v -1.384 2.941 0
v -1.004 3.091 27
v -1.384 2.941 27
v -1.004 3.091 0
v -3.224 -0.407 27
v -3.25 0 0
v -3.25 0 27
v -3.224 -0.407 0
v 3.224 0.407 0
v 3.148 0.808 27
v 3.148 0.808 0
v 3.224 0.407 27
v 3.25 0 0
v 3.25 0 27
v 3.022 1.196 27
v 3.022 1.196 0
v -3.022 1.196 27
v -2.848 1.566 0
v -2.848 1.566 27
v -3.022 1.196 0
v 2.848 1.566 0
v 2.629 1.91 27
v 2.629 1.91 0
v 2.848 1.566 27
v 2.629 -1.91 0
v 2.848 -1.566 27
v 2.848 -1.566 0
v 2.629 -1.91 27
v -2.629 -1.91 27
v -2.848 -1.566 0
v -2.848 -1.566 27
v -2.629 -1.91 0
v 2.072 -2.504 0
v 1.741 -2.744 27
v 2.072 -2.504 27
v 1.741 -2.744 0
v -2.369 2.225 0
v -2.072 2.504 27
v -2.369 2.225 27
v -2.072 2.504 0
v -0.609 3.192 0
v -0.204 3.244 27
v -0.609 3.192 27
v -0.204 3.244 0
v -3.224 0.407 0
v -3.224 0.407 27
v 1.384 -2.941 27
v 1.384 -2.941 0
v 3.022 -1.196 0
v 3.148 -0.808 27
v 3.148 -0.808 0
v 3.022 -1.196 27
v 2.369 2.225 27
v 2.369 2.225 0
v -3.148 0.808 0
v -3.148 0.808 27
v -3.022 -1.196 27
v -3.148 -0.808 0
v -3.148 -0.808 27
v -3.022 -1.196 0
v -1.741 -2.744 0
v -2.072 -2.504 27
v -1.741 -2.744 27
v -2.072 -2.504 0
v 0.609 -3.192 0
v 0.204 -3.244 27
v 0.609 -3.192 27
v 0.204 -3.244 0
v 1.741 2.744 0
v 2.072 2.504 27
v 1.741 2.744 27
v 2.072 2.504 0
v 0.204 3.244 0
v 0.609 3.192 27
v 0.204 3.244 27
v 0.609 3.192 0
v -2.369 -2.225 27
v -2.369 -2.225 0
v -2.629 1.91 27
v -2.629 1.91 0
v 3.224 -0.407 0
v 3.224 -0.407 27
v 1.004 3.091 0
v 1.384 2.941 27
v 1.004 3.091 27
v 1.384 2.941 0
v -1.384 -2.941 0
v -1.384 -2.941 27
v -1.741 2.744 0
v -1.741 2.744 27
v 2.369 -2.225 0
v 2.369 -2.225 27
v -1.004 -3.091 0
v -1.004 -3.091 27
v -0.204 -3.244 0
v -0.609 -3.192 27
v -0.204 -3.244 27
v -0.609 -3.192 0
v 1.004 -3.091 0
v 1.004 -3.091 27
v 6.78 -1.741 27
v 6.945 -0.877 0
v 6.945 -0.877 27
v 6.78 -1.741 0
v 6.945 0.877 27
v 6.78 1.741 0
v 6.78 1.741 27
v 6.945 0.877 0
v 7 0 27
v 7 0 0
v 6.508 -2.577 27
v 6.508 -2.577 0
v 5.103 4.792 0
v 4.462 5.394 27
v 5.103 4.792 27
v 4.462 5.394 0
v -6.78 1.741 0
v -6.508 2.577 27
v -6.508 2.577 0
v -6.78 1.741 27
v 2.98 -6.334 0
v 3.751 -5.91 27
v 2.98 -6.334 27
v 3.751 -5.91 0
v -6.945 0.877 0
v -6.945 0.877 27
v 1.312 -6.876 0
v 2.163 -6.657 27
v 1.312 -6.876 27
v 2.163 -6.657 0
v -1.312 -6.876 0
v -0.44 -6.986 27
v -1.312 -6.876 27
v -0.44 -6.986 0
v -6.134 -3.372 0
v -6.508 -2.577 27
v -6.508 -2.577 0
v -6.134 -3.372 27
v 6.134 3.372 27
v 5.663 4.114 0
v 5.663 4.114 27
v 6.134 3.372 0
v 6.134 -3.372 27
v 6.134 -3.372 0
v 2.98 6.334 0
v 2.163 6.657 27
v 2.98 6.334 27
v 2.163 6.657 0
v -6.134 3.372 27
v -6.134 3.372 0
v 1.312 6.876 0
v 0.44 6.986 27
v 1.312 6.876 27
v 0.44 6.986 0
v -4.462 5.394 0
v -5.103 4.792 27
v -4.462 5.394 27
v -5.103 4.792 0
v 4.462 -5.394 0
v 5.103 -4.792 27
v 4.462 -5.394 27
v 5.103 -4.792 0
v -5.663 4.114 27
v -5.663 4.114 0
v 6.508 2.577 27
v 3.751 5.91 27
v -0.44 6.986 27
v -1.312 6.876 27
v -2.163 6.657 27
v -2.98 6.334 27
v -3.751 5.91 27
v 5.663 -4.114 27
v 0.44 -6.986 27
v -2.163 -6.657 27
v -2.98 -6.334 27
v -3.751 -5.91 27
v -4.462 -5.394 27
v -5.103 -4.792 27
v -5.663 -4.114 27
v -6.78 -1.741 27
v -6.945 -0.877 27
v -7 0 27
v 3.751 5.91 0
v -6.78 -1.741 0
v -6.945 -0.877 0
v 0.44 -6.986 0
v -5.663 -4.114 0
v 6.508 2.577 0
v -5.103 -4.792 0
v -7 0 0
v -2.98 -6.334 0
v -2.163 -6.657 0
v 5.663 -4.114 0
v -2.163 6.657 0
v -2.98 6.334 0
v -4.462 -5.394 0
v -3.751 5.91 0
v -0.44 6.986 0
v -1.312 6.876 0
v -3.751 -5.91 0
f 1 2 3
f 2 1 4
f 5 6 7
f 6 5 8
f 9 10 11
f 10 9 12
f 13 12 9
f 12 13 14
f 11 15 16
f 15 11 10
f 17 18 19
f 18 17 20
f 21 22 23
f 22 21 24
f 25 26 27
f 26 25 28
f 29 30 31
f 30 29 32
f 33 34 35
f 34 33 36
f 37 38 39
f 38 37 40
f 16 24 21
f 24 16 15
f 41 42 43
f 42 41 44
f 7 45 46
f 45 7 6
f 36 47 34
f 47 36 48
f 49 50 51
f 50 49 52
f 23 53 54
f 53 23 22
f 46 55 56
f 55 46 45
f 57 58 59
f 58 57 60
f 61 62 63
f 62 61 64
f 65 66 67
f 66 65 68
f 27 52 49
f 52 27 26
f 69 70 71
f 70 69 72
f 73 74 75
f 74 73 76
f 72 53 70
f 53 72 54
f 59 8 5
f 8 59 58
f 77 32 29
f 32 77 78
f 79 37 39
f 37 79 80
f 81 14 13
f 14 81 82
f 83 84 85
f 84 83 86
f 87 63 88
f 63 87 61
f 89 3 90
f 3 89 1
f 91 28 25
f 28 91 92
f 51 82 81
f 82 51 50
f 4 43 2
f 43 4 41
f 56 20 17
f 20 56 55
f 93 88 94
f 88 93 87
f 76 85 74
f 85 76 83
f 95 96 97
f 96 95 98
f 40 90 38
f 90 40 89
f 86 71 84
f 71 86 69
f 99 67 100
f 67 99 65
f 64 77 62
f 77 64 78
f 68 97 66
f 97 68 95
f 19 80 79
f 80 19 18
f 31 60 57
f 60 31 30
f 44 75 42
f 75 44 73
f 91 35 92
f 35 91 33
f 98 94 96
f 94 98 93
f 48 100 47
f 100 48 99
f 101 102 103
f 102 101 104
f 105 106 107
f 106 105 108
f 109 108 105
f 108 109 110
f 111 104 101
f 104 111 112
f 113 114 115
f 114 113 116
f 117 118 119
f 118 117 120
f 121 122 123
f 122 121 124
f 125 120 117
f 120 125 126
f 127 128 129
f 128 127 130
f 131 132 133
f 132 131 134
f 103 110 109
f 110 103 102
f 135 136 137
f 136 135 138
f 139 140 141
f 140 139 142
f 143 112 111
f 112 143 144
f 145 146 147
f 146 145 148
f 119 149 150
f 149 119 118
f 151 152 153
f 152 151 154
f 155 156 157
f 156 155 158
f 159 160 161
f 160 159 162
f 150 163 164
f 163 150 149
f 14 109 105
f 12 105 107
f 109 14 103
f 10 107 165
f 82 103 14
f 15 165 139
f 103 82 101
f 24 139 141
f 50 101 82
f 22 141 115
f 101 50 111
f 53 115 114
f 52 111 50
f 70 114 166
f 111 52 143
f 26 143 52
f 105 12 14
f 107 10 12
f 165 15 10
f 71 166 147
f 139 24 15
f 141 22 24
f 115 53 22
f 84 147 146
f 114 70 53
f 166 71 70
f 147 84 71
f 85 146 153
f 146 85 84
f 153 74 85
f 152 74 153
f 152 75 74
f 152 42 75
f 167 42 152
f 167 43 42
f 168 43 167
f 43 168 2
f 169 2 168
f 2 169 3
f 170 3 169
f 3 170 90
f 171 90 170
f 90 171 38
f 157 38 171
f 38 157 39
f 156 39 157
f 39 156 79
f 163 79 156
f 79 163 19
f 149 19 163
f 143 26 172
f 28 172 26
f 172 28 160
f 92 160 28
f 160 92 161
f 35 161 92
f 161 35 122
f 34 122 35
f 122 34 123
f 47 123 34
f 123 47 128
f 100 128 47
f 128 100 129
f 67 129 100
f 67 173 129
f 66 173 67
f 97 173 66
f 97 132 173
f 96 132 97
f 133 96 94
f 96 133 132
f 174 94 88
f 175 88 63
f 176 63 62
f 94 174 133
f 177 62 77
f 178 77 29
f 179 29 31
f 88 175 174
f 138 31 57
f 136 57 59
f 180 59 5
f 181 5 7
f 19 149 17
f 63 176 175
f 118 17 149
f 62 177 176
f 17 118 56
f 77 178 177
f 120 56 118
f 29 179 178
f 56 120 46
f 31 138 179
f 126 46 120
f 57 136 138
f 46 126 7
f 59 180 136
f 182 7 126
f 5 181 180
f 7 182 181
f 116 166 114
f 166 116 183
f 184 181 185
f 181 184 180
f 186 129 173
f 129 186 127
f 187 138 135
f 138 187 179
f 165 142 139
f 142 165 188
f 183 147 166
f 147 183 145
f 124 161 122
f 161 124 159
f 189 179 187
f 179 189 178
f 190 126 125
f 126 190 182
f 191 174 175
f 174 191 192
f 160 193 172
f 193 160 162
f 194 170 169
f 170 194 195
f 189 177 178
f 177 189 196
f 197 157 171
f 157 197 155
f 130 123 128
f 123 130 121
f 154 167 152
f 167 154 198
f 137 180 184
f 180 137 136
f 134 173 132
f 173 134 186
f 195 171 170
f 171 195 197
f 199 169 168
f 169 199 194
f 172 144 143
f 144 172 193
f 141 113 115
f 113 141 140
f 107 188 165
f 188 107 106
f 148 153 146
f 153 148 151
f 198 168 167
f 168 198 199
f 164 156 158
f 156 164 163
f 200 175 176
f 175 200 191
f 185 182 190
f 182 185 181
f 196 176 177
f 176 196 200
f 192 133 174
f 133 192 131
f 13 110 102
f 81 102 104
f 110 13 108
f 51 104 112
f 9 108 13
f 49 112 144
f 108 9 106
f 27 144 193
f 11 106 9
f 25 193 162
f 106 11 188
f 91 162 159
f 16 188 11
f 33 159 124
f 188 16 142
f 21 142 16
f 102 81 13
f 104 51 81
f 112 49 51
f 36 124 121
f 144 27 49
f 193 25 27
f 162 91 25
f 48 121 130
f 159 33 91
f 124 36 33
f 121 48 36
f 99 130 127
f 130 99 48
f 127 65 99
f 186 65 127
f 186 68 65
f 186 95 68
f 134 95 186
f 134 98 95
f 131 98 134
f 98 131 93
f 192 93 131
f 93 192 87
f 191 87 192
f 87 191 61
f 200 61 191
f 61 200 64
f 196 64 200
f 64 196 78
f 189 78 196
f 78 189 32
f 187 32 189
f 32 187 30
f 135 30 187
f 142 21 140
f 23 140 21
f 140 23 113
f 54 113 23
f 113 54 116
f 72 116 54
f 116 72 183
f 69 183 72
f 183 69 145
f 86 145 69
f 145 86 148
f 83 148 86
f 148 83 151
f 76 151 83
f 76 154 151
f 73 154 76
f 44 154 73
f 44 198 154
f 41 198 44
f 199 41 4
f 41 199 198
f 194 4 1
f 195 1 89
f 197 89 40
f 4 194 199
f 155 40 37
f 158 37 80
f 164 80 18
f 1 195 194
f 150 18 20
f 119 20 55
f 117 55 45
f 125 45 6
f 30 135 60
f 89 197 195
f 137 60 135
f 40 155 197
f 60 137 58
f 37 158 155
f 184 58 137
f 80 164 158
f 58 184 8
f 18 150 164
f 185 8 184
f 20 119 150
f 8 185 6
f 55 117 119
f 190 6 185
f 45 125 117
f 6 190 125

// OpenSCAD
$fn = 50;


difference() {
	union() {
		*color(alpha = 1.0000000000, c = "gray") {
			translate(v = [0, 7, 0]) {
				linear_extrude(height = 1) {
					text(font = "Arial:style=Bold", halign = "center", size = 4.5000000000, text = "COMMENT plate main", valign = "center");
				}
			}
		}
		*color(alpha = 1.0000000000, c = "gray") {
			translate(v = [0, 14, 0]) {
				linear_extrude(height = 1) {
					text(font = "Arial:style=Bold", halign = "center", size = 4.5000000000, text = "COMMENT description oobb_plate_shape_p_type_27_depth_1_width_1_height_27_thickness_true_both_holes", valign = "center");
				}
			}
		}
		cylinder(h = 27, r = 7.0000000000);
	}
	union() {
		*color(alpha = 1.0000000000, c = "gray") {
			translate(v = [0, 7, 0]) {
				linear_extrude(height = 1) {
					text(font = "Arial:style=Bold", halign = "center", size = 4.5000000000, text = "COMMENT holes main", valign = "center");
				}
			}
		}
		*color(alpha = 1.0000000000, c = "gray") {
			translate(v = [0, 14, 0]) {
				linear_extrude(height = 1) {
					text(font = "Arial:style=Bold", halign = "center", size = 4.5000000000, text = "COMMENT description oobb_holes_shape_n_type_1_width_1_height_27_thickness_true_both_holes", valign = "center");
				}
			}
		}
		translate(v = [0, 0, -50]) {
			cylinder(h = 100, r = 3.2500000000);
		}
		translate(v = [0, 0, -50]) {
			cylinder(h = 100, r = 1.8000000000);
		}
	}
}
